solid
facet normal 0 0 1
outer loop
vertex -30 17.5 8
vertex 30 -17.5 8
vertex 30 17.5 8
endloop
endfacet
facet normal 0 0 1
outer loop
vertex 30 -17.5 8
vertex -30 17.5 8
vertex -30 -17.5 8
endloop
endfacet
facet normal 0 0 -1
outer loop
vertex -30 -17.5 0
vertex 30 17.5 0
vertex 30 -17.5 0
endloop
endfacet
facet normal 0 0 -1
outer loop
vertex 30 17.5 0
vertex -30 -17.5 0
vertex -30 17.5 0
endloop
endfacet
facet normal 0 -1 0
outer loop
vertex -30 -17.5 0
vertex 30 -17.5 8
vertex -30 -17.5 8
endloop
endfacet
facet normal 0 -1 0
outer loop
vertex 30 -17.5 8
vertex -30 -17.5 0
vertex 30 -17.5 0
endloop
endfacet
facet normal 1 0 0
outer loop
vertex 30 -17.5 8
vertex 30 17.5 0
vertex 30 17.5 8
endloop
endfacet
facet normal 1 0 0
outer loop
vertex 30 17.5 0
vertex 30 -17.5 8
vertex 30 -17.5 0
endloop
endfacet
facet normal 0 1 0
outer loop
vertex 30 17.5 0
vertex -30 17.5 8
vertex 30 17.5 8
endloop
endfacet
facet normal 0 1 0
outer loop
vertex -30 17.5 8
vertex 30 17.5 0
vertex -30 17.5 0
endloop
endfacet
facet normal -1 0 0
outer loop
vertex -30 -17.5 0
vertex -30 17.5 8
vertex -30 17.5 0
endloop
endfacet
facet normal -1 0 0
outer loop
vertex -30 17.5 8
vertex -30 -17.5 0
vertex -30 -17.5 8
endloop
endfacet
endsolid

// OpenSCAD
// Generated with SolidPython2 for OpenSCAD task-001
$fn = 64;

translate(v = [-30.0, -17.5, 0]) {
	cube(size = [60, 35, 8]);
}
